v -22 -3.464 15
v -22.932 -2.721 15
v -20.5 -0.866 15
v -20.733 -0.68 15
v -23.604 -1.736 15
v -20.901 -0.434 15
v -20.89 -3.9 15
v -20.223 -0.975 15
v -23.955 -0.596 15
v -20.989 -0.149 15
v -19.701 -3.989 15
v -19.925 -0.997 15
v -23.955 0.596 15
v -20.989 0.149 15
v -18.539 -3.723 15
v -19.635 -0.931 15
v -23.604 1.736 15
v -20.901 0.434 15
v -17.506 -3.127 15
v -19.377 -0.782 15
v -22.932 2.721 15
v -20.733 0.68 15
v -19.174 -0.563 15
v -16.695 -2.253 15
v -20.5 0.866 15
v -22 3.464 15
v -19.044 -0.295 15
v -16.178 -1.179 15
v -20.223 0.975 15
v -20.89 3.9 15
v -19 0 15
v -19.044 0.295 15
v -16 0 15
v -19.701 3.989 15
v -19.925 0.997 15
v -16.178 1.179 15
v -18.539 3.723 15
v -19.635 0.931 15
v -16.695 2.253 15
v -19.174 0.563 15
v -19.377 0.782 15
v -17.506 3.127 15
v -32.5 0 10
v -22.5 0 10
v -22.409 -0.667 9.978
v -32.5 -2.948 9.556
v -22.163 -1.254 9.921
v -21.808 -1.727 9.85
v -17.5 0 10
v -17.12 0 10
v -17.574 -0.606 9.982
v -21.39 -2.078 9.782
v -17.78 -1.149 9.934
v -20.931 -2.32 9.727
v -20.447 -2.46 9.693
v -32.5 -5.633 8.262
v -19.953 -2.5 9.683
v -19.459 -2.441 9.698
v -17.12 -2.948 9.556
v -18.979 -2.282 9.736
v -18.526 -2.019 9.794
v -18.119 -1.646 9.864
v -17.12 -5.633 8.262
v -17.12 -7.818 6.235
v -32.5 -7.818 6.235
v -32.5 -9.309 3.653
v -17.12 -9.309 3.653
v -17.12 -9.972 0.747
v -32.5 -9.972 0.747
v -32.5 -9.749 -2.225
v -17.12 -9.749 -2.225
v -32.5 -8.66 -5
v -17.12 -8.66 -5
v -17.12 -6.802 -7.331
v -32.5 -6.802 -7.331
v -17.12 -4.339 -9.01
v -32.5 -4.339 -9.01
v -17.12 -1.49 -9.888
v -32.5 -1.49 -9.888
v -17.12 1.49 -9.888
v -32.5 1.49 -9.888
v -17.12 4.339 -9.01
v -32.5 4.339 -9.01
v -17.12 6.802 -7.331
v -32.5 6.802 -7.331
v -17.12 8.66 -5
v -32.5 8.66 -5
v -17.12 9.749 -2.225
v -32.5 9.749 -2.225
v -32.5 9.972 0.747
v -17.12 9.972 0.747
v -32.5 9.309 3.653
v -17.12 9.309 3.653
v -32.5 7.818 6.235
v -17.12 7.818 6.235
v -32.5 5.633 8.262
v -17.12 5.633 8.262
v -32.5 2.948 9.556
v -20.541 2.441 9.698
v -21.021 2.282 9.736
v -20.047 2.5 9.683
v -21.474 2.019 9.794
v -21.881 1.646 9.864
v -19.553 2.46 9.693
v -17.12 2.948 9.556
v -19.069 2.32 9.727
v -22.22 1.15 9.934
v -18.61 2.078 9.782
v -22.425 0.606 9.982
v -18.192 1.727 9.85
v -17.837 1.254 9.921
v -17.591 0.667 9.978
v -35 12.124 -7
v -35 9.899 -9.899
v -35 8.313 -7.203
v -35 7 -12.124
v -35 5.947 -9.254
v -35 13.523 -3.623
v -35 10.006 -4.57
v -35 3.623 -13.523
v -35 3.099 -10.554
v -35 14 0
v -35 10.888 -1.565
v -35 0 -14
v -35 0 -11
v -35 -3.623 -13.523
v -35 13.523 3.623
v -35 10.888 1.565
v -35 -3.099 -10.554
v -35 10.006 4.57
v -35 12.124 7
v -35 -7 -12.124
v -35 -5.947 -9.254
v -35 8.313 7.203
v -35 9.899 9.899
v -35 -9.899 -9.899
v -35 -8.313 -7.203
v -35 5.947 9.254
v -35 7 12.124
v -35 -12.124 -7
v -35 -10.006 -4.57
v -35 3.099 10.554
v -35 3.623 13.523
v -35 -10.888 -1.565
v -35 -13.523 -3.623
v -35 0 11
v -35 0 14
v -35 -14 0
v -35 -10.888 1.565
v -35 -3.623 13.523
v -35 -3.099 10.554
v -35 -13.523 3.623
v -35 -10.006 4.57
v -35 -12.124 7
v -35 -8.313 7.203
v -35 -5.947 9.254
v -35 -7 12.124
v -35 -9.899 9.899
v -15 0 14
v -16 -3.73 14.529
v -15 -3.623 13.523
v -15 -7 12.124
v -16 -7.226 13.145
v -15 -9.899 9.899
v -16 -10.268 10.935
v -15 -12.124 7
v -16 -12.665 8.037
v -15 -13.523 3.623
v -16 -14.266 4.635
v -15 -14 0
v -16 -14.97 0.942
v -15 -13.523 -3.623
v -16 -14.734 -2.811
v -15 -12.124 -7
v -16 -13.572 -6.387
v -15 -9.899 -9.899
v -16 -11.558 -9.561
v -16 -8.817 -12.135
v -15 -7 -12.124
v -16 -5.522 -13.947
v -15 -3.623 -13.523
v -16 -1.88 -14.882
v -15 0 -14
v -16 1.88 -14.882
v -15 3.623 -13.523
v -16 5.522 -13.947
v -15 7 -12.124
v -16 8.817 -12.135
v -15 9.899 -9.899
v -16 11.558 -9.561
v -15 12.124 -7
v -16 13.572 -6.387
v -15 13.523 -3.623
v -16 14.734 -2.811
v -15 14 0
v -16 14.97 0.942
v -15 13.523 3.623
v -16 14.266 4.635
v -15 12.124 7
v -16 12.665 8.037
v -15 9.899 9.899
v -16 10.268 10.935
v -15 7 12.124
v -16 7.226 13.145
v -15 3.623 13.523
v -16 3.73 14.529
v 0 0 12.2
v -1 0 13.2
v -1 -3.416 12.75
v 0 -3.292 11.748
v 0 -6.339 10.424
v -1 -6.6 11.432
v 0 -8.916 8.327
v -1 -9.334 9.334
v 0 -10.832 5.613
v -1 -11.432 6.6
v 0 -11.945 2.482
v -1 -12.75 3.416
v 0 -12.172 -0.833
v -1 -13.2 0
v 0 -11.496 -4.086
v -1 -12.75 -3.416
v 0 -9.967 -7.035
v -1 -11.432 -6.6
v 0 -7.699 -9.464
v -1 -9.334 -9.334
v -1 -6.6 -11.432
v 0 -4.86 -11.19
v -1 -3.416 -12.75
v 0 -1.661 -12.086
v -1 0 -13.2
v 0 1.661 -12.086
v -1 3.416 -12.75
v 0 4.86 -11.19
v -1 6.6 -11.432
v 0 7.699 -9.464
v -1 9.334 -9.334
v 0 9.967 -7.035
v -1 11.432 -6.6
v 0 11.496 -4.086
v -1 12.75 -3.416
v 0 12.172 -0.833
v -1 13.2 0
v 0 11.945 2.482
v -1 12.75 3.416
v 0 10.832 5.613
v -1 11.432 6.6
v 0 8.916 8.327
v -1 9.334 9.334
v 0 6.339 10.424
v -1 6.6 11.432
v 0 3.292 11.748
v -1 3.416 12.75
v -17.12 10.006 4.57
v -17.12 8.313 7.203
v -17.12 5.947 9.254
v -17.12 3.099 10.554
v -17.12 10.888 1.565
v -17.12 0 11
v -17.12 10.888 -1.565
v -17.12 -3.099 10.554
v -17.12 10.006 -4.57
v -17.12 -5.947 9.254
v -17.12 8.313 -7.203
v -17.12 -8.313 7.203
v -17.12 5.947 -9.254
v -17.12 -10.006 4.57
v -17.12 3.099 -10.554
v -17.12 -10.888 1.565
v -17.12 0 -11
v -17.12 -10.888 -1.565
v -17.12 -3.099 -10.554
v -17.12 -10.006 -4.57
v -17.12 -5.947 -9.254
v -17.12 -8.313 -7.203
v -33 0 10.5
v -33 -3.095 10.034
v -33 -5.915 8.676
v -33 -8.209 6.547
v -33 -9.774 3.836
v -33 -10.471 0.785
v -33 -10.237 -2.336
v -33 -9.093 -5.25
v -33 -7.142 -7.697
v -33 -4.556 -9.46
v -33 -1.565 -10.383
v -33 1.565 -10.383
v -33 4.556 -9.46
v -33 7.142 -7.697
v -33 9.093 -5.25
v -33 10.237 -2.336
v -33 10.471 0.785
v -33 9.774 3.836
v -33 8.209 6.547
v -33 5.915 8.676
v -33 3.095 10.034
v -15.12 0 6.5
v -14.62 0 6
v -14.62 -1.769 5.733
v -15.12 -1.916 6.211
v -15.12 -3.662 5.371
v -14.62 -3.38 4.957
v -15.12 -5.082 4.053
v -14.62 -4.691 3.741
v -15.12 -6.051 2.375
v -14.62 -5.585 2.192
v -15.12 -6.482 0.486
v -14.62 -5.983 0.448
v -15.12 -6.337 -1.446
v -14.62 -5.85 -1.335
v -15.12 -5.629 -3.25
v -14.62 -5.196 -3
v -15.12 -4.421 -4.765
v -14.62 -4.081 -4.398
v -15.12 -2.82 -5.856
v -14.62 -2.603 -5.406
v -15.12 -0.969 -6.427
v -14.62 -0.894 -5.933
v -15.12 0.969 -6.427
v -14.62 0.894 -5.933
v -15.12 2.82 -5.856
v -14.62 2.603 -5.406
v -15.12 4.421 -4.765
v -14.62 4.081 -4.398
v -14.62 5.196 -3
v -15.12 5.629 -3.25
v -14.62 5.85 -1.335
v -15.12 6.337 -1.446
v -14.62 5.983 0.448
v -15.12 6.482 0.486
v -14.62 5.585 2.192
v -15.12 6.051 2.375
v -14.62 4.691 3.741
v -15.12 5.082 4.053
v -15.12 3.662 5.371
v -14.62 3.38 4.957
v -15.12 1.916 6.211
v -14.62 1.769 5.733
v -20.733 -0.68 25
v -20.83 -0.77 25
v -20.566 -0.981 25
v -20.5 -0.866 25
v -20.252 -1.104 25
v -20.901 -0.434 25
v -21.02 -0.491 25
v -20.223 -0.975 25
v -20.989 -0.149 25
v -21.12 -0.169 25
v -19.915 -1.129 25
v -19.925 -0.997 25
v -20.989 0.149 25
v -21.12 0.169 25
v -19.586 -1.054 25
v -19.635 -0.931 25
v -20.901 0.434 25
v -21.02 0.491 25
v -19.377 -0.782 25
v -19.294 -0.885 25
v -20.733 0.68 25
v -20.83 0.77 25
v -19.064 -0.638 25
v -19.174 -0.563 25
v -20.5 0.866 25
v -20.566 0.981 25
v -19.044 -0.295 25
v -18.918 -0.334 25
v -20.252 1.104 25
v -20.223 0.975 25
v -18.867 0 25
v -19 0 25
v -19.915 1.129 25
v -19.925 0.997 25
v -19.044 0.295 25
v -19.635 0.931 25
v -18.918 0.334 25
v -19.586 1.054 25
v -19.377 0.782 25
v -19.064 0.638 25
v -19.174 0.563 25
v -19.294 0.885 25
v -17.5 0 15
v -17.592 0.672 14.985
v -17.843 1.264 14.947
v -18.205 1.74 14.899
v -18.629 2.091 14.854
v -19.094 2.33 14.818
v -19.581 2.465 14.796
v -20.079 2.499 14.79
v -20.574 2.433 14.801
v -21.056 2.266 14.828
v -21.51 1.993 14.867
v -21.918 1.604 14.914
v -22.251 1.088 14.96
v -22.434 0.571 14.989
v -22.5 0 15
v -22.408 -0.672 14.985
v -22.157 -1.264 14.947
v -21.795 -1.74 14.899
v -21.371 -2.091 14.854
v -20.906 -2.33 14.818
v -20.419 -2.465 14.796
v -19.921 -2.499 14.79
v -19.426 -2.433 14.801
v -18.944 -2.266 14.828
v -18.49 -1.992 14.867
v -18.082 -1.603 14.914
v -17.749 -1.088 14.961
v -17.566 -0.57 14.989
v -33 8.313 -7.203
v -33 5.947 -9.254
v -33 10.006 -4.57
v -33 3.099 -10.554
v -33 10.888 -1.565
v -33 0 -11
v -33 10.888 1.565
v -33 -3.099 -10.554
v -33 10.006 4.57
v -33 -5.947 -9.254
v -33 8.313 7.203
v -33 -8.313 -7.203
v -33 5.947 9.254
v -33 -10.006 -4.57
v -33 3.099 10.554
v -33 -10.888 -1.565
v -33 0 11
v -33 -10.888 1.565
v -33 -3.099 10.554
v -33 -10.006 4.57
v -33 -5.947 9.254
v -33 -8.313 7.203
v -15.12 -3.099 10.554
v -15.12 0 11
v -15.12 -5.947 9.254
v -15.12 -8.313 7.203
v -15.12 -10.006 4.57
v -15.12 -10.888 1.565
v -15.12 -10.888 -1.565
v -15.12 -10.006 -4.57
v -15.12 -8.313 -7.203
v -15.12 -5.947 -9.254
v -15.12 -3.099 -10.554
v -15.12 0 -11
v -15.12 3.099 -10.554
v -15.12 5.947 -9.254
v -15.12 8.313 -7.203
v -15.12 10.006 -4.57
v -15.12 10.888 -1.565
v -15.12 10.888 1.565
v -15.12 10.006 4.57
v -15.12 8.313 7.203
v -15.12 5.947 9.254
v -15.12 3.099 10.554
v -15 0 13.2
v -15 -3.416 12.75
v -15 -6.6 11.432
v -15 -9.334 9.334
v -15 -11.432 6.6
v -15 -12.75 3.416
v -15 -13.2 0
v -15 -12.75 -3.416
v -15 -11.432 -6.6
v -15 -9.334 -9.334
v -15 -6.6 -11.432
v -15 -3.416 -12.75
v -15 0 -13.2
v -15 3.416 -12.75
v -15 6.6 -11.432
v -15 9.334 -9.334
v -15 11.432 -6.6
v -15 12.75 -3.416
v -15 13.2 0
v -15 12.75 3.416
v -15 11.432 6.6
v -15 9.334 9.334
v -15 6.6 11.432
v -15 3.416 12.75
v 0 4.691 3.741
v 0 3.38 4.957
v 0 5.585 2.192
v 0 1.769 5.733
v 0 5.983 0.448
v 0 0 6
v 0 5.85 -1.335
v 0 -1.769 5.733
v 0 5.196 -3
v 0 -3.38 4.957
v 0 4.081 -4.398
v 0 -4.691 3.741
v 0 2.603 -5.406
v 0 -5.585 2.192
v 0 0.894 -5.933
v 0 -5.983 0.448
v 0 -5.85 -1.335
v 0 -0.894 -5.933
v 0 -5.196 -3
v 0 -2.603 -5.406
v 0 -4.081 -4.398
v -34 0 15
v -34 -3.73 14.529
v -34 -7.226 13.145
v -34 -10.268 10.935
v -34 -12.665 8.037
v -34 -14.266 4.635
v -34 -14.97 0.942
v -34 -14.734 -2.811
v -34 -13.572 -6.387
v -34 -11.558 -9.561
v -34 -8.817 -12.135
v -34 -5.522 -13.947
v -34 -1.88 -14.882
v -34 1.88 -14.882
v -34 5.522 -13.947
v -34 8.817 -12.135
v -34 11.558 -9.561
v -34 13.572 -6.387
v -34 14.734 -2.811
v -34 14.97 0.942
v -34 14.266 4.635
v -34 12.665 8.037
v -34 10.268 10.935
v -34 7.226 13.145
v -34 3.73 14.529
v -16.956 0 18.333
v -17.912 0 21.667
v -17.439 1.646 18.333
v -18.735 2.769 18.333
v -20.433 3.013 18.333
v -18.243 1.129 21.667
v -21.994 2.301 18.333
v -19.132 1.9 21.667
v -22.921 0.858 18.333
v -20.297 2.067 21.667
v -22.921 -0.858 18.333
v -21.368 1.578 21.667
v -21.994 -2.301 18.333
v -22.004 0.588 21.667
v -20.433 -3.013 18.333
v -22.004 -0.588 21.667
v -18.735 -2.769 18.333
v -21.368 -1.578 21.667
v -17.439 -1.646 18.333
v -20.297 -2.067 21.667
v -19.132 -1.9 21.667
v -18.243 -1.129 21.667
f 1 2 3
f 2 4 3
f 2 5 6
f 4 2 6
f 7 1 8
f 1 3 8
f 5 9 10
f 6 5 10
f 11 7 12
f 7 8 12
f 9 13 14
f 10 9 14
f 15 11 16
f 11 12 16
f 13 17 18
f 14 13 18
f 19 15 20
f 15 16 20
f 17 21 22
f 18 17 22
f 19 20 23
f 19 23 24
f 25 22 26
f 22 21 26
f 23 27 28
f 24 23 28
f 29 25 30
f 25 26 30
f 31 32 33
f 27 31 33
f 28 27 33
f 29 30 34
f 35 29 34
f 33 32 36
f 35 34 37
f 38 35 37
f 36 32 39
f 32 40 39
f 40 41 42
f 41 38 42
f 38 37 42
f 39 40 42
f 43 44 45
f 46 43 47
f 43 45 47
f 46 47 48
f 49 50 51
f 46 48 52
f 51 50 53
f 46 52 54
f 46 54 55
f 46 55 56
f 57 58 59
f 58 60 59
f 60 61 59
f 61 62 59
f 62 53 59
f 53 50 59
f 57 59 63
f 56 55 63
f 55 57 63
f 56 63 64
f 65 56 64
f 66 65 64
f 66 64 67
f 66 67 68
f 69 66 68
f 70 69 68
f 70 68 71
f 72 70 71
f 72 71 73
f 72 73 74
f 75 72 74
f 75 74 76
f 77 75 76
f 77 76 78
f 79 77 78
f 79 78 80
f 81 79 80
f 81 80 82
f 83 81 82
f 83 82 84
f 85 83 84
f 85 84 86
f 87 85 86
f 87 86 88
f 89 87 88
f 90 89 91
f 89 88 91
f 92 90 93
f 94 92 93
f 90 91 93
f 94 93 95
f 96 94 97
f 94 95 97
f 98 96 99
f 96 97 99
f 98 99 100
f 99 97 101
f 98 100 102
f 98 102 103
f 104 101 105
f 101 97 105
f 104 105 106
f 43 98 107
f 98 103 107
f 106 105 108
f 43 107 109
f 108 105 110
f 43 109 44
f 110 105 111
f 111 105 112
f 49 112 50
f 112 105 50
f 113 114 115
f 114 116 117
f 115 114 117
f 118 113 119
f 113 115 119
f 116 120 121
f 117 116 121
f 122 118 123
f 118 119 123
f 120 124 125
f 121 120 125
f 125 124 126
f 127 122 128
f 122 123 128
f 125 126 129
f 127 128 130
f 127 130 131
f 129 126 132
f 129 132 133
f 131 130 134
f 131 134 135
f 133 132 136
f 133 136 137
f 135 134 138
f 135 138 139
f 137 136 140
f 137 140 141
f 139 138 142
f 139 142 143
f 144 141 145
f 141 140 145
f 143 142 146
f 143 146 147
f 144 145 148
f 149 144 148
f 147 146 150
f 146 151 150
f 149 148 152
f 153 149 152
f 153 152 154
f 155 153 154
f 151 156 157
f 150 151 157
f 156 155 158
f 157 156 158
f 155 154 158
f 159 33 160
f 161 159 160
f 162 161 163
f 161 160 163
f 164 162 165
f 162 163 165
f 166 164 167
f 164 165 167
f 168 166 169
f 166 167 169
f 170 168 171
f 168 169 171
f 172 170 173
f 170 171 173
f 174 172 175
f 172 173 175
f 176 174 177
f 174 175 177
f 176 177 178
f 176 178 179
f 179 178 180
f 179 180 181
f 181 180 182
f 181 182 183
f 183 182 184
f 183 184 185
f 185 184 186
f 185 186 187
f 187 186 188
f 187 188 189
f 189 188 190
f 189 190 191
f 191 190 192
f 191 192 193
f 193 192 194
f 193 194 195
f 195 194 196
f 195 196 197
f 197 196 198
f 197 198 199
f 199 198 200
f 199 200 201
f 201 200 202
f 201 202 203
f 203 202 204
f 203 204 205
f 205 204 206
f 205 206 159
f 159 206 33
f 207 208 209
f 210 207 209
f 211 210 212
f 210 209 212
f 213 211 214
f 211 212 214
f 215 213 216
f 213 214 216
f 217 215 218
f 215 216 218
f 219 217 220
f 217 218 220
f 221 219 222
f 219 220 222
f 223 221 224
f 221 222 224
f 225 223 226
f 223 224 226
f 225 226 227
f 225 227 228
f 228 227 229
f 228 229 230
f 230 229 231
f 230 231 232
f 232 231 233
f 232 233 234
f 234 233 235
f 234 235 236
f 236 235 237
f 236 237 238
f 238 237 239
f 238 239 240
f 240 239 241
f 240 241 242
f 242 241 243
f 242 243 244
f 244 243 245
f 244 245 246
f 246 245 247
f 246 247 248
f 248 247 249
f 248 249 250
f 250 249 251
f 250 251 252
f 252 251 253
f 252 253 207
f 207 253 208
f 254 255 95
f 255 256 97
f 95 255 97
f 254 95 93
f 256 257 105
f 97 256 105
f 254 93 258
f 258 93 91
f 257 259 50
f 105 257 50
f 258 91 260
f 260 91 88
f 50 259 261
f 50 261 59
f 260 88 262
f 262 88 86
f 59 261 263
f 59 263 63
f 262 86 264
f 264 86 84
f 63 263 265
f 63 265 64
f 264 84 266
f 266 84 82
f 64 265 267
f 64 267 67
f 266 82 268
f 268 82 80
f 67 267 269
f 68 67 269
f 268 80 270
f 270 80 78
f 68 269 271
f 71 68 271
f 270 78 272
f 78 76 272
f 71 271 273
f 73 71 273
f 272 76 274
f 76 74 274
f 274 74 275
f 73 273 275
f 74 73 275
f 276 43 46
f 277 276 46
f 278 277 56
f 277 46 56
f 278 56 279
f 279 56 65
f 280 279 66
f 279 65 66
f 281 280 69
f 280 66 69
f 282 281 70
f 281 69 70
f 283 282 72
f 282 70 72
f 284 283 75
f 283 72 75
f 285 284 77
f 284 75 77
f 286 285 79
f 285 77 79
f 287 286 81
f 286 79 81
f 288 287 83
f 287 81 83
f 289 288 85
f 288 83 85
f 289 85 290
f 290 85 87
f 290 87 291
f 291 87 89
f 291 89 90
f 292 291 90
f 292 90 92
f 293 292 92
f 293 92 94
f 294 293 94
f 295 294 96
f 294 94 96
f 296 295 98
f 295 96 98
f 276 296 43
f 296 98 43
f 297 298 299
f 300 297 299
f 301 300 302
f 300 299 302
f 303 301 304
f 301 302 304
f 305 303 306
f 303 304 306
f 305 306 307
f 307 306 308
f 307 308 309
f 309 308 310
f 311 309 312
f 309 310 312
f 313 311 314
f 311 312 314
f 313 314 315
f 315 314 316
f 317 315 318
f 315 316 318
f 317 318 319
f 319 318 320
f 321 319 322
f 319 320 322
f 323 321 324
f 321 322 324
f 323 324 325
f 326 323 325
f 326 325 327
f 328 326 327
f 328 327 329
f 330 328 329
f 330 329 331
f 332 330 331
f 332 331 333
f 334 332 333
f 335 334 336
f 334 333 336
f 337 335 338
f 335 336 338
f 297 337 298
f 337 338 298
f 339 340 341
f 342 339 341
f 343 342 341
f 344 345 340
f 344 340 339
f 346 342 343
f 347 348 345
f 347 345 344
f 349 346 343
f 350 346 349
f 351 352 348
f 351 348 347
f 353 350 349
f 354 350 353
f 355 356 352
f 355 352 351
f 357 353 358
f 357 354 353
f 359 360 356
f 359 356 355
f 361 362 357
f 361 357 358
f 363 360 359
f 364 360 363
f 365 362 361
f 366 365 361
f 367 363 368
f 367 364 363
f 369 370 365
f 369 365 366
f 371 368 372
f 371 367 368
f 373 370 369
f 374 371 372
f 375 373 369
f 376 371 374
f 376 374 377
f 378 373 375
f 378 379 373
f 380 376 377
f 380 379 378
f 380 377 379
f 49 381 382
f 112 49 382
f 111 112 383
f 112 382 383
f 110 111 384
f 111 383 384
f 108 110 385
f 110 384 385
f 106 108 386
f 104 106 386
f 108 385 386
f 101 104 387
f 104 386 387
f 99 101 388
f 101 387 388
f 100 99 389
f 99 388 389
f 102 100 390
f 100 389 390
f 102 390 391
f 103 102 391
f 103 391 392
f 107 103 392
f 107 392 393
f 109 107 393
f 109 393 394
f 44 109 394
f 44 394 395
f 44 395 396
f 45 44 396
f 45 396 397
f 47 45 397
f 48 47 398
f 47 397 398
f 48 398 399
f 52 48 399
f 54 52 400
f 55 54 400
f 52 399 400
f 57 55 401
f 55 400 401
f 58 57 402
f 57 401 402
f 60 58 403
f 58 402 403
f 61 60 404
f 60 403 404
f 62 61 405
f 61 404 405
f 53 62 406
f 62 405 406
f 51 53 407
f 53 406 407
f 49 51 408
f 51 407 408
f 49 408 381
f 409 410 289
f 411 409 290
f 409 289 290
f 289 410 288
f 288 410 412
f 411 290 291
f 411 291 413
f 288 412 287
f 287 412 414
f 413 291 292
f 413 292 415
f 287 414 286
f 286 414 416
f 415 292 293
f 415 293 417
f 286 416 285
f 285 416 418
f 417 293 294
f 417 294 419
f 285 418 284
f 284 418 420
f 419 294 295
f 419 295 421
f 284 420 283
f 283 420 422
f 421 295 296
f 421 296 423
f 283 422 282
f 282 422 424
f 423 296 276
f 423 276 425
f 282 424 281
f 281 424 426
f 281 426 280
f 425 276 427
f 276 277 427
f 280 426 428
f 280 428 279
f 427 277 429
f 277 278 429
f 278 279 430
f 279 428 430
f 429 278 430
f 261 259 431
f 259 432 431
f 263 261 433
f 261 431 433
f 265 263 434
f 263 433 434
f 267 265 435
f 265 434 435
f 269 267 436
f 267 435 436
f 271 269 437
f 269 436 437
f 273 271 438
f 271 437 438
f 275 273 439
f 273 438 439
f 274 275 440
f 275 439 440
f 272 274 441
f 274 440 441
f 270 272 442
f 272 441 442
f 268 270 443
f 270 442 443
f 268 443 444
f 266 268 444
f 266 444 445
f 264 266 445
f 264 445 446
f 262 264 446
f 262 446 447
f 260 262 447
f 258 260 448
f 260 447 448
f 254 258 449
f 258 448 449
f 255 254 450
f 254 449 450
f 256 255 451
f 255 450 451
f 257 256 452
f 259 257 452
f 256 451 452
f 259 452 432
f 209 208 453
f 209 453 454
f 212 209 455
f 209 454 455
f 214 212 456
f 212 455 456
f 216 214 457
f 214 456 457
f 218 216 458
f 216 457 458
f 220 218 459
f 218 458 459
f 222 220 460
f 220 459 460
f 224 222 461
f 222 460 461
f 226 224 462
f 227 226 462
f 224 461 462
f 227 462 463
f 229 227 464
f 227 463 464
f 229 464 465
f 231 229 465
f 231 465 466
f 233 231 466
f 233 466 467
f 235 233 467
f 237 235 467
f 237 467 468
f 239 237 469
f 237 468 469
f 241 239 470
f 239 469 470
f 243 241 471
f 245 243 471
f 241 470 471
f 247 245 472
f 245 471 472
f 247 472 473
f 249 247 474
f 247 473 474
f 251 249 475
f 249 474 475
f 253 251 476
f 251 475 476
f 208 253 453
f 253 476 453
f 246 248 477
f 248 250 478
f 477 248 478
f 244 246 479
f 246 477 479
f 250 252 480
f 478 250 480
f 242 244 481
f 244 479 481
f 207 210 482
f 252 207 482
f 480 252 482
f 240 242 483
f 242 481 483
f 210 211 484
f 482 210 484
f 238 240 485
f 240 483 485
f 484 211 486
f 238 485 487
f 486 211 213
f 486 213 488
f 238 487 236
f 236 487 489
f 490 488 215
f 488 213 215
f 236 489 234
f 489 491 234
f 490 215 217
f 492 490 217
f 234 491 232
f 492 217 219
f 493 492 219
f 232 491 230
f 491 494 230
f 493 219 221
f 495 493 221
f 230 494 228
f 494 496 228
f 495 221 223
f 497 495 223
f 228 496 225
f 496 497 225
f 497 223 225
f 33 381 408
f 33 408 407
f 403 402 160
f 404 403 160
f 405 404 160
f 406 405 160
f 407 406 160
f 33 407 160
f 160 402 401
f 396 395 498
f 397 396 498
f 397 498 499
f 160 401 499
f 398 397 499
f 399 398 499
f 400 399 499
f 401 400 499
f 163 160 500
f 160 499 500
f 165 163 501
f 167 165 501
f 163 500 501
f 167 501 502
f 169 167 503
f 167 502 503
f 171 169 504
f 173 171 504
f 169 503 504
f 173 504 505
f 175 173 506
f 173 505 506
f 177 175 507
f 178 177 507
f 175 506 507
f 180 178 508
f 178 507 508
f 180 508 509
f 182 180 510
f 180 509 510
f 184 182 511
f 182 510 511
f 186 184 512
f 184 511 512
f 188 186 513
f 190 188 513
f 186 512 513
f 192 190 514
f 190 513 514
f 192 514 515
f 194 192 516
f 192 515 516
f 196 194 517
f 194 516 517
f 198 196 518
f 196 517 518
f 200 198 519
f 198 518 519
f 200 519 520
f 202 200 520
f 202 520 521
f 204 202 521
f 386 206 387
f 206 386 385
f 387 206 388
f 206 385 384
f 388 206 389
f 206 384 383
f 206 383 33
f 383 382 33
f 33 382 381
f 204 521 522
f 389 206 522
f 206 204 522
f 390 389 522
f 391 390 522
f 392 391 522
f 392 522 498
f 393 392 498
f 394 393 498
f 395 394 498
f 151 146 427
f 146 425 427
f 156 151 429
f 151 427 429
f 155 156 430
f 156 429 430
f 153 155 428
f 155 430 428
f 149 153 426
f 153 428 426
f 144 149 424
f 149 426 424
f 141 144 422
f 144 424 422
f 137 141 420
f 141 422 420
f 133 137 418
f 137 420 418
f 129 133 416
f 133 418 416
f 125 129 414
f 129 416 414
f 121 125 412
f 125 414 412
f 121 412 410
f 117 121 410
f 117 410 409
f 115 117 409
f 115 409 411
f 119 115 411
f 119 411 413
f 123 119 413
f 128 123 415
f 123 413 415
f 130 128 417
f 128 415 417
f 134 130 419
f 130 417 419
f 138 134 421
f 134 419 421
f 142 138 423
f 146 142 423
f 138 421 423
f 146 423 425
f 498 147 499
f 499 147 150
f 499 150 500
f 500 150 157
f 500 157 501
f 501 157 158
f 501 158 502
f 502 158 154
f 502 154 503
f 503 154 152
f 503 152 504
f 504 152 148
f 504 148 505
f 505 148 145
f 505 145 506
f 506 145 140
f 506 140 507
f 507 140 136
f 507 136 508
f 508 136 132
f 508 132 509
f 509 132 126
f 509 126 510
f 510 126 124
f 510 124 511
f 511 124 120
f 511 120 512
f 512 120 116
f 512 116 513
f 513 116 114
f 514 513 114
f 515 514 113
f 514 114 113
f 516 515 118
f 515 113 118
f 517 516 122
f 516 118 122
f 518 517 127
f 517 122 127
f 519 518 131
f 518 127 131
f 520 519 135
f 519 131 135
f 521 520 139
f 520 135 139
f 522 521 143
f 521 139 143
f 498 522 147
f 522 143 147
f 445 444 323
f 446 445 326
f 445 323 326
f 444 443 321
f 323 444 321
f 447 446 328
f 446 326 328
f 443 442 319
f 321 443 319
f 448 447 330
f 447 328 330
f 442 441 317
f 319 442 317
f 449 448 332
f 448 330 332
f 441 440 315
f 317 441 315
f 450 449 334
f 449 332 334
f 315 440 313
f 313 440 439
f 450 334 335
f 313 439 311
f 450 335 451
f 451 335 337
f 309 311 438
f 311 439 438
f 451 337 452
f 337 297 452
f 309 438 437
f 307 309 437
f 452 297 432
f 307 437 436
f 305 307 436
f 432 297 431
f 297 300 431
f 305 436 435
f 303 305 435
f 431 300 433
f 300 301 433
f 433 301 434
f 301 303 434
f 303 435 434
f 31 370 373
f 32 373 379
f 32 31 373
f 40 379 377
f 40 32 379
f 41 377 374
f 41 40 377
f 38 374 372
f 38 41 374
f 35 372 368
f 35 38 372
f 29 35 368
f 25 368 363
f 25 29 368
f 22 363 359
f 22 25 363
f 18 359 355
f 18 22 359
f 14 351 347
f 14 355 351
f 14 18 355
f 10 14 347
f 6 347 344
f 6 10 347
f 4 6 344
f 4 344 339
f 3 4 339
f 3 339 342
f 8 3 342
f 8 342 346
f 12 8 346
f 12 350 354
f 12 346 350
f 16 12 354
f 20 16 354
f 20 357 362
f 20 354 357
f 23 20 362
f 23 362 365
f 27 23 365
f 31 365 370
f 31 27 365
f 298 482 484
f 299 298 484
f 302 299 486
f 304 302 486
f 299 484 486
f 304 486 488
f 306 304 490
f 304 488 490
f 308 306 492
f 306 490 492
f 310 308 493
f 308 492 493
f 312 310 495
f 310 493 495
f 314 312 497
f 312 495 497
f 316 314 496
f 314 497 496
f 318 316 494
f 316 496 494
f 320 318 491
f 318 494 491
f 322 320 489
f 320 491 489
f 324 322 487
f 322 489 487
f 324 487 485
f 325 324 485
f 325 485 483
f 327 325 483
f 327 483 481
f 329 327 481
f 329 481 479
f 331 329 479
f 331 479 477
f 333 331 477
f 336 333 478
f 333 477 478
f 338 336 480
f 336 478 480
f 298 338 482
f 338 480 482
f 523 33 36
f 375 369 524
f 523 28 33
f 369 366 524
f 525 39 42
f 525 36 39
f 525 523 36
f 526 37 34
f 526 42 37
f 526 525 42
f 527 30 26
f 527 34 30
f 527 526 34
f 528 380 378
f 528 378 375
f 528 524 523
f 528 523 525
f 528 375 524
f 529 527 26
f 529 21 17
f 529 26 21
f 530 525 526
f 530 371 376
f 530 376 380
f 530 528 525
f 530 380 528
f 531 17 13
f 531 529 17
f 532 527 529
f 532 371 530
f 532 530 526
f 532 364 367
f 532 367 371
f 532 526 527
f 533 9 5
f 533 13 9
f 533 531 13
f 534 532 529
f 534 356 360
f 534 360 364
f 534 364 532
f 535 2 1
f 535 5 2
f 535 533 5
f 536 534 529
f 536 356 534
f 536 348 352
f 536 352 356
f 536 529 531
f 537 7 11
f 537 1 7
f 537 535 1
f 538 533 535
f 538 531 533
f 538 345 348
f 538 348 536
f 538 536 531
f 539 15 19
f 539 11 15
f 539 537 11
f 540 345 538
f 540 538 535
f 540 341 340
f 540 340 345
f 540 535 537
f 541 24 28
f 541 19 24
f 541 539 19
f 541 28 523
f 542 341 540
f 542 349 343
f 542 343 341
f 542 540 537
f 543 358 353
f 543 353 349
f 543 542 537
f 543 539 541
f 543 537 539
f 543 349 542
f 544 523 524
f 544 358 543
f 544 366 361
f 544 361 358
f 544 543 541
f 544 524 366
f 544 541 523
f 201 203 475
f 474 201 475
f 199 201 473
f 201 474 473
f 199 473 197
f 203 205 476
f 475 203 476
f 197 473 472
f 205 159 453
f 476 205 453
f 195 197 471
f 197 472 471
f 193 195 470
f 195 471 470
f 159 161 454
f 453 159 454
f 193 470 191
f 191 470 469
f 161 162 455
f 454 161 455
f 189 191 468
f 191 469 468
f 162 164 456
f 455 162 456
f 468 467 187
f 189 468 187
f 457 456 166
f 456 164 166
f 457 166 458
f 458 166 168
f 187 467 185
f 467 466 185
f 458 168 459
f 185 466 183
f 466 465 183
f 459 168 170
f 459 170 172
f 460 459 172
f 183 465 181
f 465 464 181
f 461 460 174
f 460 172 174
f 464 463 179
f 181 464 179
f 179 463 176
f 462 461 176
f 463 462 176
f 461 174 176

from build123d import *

# Parameters (mm, degrees)
CHAMFER1_SIZE  = 0.5
CHAMFER2_SIZE  = 0.5
CHAMFER3_SIZE  = 1
SKETCH2_R      = 2.5
EXTRUDE1_DEPTH = 10
SKETCH3_R      = 4
EXTRUDE2_DEPTH = 10
EXTRUDE2_TAPER = 16
SKETCH4_R      = 1
EXTRUDE3_DEPTH = 20


with BuildPart() as part:
    # Sketch1 → Revolve1 (revolve)
    with BuildSketch(Plane.XY, mode=Mode.PRIVATE) as revolve1_sk:
        Polygon((0, 6), (0, 13.2), (-15, 13.2), (-15, 15), (-35, 15), (-35, 11), (-33, 11), (-33, 10), (-17.11967558, 10), (-17.11967558, 11), (-15.11967558, 11), (-15.11967558, 6), align=None)
    revolve(revolve1_sk.sketch.rotate(Axis((-35, 0, 0), (1, 0, 0)), 90), axis=Axis((-35, 0, 0), (1, 0, 0)))

    # Chamfer1
    chamfer1_edges = [part.edges().sort_by_distance(p)[0] for p in [
        (-33, 0, -10),
    ]]
    chamfer(chamfer1_edges, length=CHAMFER1_SIZE)

    # Chamfer2
    chamfer2_edges = [part.edges().sort_by_distance(p)[0] for p in [
        (-15.11967558, 0, -6),
    ]]
    chamfer(chamfer2_edges, length=CHAMFER2_SIZE)

    # Chamfer3
    chamfer3_edges = [part.edges().sort_by_distance(p)[0] for p in [
        (0, 0, -13.2),
        (-15, 0, -15),
        (-35, 0, -15),
    ]]
    chamfer(chamfer3_edges, length=CHAMFER3_SIZE)

    # Sketch2 → Extrude1 (cut)
    with BuildSketch(Plane.XY.offset(15)):
        with Locations((-20, 0)):
            Circle(SKETCH2_R)
    extrude(amount=-EXTRUDE1_DEPTH, mode=Mode.SUBTRACT)


with BuildPart() as body_2:
    # Sketch3 → Extrude2 (new body)
    with BuildSketch(Plane.XY.offset(15)):
        with Locations((-20, 0)):
            Circle(SKETCH3_R)
    extrude(amount=EXTRUDE2_DEPTH, taper=EXTRUDE2_TAPER)

    # Sketch4 → Extrude3 (cut)
    with BuildSketch(Plane.XY.offset(15)):
        with Locations((-20, 0)):
            Circle(SKETCH4_R)
    extrude(amount=EXTRUDE3_DEPTH, mode=Mode.SUBTRACT)


solid = Compound([part.part, body_2.part])
